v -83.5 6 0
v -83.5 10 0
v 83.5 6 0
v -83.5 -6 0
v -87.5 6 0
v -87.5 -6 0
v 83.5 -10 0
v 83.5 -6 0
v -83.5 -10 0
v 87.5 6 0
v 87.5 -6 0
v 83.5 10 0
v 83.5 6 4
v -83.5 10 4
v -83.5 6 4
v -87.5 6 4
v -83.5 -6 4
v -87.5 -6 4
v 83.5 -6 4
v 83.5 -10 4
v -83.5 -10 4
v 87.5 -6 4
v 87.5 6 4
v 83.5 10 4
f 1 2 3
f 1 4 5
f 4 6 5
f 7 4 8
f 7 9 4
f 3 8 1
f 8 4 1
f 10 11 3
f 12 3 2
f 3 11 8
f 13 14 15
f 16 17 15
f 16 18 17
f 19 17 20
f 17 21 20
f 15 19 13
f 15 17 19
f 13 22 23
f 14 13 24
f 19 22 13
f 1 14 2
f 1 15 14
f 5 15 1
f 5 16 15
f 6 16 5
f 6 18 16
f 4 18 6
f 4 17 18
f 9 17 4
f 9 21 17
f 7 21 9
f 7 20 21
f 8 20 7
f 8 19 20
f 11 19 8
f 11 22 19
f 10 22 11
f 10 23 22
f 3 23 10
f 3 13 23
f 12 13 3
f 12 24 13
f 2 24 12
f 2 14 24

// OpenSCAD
// file: 2.1.scad
include <../globals.scad>
include <./globals.scad>

/* The base shape. Apply a reduction to make it smaller. */
module rear_core_base_shape(reduction=0) {
    hull() {
        circle((rear_core_width-reduction)/2);
        translate([0, rear_core_height-rear_core_width, 0]) circle((rear_core_width-reduction)/2);
    }
}

/* A hole for the reinforcement bar. Default values are for the two primary reinforcement holes. */
module rear_core_reinforcement_bar_hole(width=rear_core_reinforcing_bar_hole_width, position=[(rear_core_width-sheet_thickness)/2, (rear_core_height-rear_core_width)/2, 0]) {
    translate(position) square([sheet_thickness, width], true);
}

/* A backplate for the main structural shape of the rear core. */
module rear_core_2_1() {
    difference() {
        // External shape
        rear_core_base_shape();
        // Internal shape
        rear_core_base_shape(reduction=rear_core_back_reduction);
        // Right rear_core_reinforcement_bar_hole
        rear_core_reinforcement_bar_hole();
        // Left rear_core_reinforcement_bar_hole
        mirror([1, 0, 0]) rear_core_reinforcement_bar_hole();
        // Bottom reinforcement bar_hole
        translate([0, -(rear_core_width-rear_core_back_reduction/2)/2, 0]) rotate([0, 0, 90]) rear_core_reinforcement_bar_hole(position=[0, 0, 0], width=rear_core_reinforcing_bar_hole_width-4);
    }
}

linear_extrude(sheet_thickness) rear_core_2_1();
// file: globals.scad
rear_core_height = 140;
rear_core_length = 187;
rear_core_width = 118;
rear_core_back_reduction = 24;
rear_core_front_reduction = 6;
rear_core_reduction_length = 12;

rear_core_reinforcing_bar_width = 20;
rear_core_reinforcing_bar_margin = 4;
rear_core_reinforcing_bar_hole_width = rear_core_reinforcing_bar_width - 2*rear_core_reinforcing_bar_margin;
// file: ../globals.scad
// units are assumed to be millimeters

// Thickness of laser cutted sheets
sheet_thickness = 4;
// Margin on printsheet
print_margin = 5;
// Curves accuracy
$fn = 360;
// main file
include <../globals.scad>
include <./globals.scad>
use <2.1.scad>

/* Like the hole for the reinforcement bar, but at a different location, so we wrap the module for convenience. */
module rear_core_reinforcement_bar_end(width=rear_core_reinforcing_bar_hole_width, position=[(rear_core_length-rear_core_reduction_length-sheet_thickness)/2, 0, 0]) {
    rear_core_reinforcement_bar_hole(width, position);
}

/* Main reinforcing bar of the rear core. */
module rear_core_2_7() {
    square([rear_core_length-rear_core_reduction_length-(2*sheet_thickness), rear_core_reinforcing_bar_width], true);
    rear_core_reinforcement_bar_end();
    mirror([1, 0, 0]) rear_core_reinforcement_bar_end();
}

linear_extrude(sheet_thickness) rear_core_2_7();
